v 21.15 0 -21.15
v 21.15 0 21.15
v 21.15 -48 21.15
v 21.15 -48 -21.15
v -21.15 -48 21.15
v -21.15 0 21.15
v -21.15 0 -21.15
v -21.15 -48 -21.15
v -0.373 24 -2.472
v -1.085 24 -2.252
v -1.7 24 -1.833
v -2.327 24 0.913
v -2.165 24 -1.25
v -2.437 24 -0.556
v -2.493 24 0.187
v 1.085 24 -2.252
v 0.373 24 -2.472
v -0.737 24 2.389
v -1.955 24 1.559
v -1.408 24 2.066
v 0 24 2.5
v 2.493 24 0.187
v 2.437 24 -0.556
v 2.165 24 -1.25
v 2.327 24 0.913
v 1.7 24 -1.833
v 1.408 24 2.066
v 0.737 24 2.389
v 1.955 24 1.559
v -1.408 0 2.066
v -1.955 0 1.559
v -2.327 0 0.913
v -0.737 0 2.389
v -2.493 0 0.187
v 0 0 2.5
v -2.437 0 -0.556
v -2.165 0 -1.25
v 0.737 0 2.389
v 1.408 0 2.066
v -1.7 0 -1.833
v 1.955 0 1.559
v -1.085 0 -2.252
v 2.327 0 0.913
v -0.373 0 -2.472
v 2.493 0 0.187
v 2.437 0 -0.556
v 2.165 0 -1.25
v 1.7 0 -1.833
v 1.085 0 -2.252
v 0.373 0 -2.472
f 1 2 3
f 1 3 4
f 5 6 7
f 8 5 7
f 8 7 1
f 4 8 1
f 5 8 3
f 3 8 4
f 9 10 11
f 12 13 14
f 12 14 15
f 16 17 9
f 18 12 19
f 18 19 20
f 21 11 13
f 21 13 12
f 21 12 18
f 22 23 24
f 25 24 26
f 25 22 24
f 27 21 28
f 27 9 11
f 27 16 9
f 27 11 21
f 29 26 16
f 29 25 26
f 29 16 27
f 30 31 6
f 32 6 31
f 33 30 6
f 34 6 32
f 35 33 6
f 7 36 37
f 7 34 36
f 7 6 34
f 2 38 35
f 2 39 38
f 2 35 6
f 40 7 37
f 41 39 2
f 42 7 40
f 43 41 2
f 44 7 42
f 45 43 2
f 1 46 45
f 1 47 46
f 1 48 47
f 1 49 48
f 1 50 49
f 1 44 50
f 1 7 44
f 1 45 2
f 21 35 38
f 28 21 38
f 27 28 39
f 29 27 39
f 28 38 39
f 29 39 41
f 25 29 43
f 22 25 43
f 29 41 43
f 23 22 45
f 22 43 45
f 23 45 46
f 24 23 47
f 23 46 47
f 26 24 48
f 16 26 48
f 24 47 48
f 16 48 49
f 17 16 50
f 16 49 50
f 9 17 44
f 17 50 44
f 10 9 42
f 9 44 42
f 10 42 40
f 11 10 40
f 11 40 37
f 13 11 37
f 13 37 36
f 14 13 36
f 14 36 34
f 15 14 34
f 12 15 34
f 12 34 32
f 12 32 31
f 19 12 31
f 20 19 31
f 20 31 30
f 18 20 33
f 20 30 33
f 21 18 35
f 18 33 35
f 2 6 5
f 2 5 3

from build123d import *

# Parameters (mm, degrees)
SKETCH2_R           = 2.5
BOSS_EXTRUDE1_DEPTH = 24
SKETCH1_W           = 42.3
SKETCH1_H           = 42.3
BOSS_EXTRUDE2_DEPTH = 48


with BuildPart() as part:
    # Sketch2 → Boss-Extrude1 (new body)
    with BuildSketch(Plane(origin=(0, 0, 0), x_dir=(1, 0, 0), z_dir=(0, 1, 0))):
        with Locations(Location((0, 0, 0), (0, 0, 270))):
            Circle(SKETCH2_R)
    extrude(amount=BOSS_EXTRUDE1_DEPTH)

    # Sketch1 → Boss-Extrude2 (add)
    with BuildSketch(Plane(origin=(0, 0, 0), x_dir=(1, 0, 0), z_dir=(0, 1, 0))):
        Rectangle(SKETCH1_W, SKETCH1_H)
    extrude(amount=-BOSS_EXTRUDE2_DEPTH)


solid = part.part
